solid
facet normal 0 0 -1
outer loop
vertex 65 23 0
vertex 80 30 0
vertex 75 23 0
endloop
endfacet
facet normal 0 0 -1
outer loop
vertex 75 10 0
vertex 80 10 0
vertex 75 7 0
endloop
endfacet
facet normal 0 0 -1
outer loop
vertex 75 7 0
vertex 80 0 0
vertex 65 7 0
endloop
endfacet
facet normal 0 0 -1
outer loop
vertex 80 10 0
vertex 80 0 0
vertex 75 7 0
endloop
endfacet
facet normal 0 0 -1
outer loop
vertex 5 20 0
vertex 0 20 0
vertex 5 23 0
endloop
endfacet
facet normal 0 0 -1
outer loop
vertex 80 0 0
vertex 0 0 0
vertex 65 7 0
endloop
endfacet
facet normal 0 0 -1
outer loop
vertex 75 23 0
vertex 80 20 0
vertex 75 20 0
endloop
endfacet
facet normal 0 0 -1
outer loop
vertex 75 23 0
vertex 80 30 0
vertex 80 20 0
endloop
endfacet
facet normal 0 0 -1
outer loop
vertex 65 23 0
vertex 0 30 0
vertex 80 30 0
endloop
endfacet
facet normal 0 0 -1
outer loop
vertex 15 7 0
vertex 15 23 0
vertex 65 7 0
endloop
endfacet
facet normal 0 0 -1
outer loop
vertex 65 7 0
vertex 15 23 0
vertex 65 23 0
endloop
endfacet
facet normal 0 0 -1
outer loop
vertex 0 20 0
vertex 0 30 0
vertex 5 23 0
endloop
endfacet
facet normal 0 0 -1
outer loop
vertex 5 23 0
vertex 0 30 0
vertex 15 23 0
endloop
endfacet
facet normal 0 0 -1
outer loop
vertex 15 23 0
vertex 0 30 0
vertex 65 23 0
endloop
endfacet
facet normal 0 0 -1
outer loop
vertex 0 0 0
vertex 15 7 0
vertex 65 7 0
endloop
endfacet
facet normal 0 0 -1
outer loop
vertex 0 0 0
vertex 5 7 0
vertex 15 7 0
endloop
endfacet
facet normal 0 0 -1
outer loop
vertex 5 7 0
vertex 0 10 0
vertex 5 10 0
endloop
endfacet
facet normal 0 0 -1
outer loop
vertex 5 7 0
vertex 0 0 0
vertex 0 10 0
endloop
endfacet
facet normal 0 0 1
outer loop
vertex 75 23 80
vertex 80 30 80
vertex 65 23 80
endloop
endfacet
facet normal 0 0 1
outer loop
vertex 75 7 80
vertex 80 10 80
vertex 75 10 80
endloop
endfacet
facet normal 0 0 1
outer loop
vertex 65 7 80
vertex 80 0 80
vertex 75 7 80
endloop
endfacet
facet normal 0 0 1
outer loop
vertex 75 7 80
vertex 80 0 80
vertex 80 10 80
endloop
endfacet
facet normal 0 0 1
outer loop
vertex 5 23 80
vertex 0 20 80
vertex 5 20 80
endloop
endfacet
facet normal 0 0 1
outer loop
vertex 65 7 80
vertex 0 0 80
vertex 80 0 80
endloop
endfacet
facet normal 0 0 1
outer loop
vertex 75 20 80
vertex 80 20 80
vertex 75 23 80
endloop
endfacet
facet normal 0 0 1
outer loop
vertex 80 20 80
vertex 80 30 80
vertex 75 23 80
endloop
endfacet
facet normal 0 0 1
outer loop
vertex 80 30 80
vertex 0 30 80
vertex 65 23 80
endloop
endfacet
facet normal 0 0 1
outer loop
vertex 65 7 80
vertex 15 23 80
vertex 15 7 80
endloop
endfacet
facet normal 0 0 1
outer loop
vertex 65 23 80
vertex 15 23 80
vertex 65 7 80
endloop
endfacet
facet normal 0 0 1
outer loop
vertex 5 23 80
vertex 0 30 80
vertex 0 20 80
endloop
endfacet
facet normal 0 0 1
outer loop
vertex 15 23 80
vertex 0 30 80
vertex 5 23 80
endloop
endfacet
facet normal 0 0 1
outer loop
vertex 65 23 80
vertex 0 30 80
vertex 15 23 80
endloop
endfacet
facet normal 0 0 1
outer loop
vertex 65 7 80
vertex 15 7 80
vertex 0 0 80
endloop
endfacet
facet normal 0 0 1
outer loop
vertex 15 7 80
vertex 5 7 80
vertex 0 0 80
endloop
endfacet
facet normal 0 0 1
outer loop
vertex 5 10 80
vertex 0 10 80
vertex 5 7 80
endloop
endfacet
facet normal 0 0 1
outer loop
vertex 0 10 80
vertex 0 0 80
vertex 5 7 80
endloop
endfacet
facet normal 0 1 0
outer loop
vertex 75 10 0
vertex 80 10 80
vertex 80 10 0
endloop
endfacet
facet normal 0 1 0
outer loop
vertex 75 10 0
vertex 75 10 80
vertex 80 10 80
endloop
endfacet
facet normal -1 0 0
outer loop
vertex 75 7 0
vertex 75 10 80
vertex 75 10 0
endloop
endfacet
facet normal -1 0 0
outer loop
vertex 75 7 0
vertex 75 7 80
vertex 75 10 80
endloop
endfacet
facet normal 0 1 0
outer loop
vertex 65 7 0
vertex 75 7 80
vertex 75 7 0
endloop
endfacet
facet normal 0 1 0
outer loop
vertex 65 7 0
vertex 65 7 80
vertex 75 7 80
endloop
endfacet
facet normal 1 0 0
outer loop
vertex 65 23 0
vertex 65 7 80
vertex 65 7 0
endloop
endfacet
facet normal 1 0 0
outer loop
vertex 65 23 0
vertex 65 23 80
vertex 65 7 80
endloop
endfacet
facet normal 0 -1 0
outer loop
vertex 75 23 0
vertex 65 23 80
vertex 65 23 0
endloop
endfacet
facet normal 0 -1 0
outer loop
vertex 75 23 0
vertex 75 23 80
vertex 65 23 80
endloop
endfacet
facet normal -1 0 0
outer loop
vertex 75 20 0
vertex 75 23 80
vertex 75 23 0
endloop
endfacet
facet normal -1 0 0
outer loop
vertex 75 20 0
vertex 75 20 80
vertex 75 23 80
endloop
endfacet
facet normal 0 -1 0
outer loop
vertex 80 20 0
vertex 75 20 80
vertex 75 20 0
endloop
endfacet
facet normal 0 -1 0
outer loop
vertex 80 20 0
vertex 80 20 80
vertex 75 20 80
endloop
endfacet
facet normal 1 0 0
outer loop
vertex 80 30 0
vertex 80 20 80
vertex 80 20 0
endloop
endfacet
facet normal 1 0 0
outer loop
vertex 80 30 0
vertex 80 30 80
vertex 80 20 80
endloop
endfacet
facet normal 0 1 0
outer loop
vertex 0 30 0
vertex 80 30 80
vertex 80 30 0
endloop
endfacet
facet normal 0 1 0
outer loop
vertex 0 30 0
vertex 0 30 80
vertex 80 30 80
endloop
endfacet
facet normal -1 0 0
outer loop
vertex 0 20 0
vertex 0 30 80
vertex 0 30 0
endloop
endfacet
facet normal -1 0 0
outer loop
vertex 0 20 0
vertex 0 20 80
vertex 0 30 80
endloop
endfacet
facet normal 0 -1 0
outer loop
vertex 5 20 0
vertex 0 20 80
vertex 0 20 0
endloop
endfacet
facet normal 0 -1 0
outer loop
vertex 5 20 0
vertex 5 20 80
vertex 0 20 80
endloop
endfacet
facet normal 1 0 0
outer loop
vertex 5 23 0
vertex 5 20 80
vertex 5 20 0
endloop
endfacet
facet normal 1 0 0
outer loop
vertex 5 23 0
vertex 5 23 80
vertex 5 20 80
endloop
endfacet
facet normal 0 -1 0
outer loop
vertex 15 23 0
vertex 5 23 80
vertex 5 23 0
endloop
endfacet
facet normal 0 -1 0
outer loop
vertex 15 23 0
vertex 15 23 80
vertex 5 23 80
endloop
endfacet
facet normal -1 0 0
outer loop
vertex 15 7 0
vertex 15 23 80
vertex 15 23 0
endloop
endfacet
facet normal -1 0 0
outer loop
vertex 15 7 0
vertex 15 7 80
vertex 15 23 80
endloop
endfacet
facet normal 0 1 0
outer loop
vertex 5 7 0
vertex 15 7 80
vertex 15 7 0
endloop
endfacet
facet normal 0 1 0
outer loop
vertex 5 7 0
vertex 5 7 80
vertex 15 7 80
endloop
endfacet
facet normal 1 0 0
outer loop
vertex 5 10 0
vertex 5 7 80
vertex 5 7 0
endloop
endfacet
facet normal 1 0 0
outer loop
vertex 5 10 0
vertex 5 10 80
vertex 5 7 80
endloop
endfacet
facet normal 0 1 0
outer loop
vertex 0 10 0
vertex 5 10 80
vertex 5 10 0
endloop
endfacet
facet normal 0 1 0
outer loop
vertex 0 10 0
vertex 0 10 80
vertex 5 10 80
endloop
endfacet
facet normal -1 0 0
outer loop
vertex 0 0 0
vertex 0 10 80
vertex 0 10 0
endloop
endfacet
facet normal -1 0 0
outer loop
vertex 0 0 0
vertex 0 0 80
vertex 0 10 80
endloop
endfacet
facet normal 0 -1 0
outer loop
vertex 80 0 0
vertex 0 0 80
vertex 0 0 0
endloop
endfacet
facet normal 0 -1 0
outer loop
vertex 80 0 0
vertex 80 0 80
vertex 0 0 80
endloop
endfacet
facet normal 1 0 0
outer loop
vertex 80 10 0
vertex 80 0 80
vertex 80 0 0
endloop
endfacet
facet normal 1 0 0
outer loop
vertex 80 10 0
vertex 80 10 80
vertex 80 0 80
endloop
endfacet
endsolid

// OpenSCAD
$fn = 32;

// ----------------------------------------------------------------------
// T-slot rail: 80 x 30 mm section, 80 mm long
// ----------------------------------------------------------------------

// --- parameters (mm) ---
profile_height = 80;      // extrusion height
profile_points = 20;      // points of the closed outline

profile = [[0, 0], [80, 0], [80, 10], [75, 10], [75, 7], [65, 7], [65, 23], [75, 23], [75, 20], [80, 20], [80, 30], [0, 30], [0, 20], [5, 20], [5, 23], [15, 23], [15, 7], [5, 7], [5, 10], [0, 10]];  // single closed polygon, 20 points, counter clockwise

// --- the one profile operation ---
linear_extrude(height = profile_height) polygon(points = profile);
